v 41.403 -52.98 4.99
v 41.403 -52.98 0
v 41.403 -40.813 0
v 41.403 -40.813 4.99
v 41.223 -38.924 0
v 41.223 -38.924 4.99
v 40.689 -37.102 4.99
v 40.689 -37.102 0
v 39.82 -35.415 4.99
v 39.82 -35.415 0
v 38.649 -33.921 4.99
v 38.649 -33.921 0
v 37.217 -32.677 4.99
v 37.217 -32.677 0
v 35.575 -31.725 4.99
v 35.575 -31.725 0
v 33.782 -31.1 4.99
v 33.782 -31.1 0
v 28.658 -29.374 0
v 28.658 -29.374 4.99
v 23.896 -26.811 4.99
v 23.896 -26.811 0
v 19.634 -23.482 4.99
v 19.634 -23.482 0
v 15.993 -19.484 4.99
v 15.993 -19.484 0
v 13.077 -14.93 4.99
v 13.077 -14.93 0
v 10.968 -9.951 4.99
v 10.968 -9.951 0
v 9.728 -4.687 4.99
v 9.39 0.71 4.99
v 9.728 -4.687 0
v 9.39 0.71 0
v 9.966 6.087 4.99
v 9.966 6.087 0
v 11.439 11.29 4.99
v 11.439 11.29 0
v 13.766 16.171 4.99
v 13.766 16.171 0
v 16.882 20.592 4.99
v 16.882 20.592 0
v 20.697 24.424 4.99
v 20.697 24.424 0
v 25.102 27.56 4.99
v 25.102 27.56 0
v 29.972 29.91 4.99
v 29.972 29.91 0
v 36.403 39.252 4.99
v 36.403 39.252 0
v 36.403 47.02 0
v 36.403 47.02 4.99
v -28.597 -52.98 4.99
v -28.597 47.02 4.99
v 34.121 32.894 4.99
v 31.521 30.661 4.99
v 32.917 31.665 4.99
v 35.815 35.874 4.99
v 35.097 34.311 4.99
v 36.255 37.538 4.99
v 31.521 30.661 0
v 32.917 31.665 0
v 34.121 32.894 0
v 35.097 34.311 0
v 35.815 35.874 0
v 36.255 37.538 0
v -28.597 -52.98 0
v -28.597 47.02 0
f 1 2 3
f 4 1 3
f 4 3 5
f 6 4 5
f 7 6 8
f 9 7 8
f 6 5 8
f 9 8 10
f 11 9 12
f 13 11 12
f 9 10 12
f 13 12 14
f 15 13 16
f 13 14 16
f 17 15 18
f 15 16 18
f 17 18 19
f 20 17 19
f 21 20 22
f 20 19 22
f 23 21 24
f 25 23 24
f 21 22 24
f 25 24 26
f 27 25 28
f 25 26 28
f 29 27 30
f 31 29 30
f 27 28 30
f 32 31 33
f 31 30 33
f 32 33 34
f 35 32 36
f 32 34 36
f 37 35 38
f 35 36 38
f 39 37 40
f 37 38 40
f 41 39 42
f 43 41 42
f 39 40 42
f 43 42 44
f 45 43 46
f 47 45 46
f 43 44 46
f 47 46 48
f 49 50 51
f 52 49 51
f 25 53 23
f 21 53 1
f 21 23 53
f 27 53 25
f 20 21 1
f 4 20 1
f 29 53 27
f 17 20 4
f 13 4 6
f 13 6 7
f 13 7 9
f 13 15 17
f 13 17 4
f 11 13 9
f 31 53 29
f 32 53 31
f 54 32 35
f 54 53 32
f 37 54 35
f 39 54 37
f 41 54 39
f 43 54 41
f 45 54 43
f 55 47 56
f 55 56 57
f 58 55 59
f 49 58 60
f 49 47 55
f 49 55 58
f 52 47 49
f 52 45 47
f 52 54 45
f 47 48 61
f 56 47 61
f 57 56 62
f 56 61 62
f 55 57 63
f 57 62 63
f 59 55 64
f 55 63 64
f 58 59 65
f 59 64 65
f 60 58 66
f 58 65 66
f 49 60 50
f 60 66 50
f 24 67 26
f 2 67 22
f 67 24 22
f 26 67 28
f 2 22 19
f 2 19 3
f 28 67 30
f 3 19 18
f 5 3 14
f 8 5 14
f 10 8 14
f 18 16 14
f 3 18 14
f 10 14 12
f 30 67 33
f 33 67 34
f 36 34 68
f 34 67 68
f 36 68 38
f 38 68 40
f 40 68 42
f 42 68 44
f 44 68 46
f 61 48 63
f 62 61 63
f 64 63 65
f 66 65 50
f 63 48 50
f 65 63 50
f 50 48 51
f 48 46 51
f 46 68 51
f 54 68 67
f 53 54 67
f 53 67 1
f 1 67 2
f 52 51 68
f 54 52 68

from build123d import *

# Parameters (mm, degrees)
F1_DEPTH = 4.99


with BuildPart() as f1:
    # F0 (on Top) → F1 (new body)
    with BuildSketch(Plane.XY):
        with BuildLine():
            Line((36.402646, 47.020067), (-28.597354, 47.020067))
            Line((-28.597354, 47.020067), (-28.597354, -52.979933))
            Line((-28.597354, -52.979933), (41.402646, -52.979933))
            Line((41.402646, -52.979933), (41.402646, -40.812817))
            ThreePointArc((41.402646, -40.812817), (39.270242, -34.640222), (33.782461, -31.10012))
            ThreePointArc((33.782461, -31.10012), (9.444835, -1.995757), (29.972369, 29.910424))
            ThreePointArc((29.972369, 29.910424), (34.639673, 33.581354), (36.402646, 39.251574))
            Line((36.402646, 39.251574), (36.402646, 47.020067))
        make_face()
    extrude(amount=F1_DEPTH)


solid = f1.part
